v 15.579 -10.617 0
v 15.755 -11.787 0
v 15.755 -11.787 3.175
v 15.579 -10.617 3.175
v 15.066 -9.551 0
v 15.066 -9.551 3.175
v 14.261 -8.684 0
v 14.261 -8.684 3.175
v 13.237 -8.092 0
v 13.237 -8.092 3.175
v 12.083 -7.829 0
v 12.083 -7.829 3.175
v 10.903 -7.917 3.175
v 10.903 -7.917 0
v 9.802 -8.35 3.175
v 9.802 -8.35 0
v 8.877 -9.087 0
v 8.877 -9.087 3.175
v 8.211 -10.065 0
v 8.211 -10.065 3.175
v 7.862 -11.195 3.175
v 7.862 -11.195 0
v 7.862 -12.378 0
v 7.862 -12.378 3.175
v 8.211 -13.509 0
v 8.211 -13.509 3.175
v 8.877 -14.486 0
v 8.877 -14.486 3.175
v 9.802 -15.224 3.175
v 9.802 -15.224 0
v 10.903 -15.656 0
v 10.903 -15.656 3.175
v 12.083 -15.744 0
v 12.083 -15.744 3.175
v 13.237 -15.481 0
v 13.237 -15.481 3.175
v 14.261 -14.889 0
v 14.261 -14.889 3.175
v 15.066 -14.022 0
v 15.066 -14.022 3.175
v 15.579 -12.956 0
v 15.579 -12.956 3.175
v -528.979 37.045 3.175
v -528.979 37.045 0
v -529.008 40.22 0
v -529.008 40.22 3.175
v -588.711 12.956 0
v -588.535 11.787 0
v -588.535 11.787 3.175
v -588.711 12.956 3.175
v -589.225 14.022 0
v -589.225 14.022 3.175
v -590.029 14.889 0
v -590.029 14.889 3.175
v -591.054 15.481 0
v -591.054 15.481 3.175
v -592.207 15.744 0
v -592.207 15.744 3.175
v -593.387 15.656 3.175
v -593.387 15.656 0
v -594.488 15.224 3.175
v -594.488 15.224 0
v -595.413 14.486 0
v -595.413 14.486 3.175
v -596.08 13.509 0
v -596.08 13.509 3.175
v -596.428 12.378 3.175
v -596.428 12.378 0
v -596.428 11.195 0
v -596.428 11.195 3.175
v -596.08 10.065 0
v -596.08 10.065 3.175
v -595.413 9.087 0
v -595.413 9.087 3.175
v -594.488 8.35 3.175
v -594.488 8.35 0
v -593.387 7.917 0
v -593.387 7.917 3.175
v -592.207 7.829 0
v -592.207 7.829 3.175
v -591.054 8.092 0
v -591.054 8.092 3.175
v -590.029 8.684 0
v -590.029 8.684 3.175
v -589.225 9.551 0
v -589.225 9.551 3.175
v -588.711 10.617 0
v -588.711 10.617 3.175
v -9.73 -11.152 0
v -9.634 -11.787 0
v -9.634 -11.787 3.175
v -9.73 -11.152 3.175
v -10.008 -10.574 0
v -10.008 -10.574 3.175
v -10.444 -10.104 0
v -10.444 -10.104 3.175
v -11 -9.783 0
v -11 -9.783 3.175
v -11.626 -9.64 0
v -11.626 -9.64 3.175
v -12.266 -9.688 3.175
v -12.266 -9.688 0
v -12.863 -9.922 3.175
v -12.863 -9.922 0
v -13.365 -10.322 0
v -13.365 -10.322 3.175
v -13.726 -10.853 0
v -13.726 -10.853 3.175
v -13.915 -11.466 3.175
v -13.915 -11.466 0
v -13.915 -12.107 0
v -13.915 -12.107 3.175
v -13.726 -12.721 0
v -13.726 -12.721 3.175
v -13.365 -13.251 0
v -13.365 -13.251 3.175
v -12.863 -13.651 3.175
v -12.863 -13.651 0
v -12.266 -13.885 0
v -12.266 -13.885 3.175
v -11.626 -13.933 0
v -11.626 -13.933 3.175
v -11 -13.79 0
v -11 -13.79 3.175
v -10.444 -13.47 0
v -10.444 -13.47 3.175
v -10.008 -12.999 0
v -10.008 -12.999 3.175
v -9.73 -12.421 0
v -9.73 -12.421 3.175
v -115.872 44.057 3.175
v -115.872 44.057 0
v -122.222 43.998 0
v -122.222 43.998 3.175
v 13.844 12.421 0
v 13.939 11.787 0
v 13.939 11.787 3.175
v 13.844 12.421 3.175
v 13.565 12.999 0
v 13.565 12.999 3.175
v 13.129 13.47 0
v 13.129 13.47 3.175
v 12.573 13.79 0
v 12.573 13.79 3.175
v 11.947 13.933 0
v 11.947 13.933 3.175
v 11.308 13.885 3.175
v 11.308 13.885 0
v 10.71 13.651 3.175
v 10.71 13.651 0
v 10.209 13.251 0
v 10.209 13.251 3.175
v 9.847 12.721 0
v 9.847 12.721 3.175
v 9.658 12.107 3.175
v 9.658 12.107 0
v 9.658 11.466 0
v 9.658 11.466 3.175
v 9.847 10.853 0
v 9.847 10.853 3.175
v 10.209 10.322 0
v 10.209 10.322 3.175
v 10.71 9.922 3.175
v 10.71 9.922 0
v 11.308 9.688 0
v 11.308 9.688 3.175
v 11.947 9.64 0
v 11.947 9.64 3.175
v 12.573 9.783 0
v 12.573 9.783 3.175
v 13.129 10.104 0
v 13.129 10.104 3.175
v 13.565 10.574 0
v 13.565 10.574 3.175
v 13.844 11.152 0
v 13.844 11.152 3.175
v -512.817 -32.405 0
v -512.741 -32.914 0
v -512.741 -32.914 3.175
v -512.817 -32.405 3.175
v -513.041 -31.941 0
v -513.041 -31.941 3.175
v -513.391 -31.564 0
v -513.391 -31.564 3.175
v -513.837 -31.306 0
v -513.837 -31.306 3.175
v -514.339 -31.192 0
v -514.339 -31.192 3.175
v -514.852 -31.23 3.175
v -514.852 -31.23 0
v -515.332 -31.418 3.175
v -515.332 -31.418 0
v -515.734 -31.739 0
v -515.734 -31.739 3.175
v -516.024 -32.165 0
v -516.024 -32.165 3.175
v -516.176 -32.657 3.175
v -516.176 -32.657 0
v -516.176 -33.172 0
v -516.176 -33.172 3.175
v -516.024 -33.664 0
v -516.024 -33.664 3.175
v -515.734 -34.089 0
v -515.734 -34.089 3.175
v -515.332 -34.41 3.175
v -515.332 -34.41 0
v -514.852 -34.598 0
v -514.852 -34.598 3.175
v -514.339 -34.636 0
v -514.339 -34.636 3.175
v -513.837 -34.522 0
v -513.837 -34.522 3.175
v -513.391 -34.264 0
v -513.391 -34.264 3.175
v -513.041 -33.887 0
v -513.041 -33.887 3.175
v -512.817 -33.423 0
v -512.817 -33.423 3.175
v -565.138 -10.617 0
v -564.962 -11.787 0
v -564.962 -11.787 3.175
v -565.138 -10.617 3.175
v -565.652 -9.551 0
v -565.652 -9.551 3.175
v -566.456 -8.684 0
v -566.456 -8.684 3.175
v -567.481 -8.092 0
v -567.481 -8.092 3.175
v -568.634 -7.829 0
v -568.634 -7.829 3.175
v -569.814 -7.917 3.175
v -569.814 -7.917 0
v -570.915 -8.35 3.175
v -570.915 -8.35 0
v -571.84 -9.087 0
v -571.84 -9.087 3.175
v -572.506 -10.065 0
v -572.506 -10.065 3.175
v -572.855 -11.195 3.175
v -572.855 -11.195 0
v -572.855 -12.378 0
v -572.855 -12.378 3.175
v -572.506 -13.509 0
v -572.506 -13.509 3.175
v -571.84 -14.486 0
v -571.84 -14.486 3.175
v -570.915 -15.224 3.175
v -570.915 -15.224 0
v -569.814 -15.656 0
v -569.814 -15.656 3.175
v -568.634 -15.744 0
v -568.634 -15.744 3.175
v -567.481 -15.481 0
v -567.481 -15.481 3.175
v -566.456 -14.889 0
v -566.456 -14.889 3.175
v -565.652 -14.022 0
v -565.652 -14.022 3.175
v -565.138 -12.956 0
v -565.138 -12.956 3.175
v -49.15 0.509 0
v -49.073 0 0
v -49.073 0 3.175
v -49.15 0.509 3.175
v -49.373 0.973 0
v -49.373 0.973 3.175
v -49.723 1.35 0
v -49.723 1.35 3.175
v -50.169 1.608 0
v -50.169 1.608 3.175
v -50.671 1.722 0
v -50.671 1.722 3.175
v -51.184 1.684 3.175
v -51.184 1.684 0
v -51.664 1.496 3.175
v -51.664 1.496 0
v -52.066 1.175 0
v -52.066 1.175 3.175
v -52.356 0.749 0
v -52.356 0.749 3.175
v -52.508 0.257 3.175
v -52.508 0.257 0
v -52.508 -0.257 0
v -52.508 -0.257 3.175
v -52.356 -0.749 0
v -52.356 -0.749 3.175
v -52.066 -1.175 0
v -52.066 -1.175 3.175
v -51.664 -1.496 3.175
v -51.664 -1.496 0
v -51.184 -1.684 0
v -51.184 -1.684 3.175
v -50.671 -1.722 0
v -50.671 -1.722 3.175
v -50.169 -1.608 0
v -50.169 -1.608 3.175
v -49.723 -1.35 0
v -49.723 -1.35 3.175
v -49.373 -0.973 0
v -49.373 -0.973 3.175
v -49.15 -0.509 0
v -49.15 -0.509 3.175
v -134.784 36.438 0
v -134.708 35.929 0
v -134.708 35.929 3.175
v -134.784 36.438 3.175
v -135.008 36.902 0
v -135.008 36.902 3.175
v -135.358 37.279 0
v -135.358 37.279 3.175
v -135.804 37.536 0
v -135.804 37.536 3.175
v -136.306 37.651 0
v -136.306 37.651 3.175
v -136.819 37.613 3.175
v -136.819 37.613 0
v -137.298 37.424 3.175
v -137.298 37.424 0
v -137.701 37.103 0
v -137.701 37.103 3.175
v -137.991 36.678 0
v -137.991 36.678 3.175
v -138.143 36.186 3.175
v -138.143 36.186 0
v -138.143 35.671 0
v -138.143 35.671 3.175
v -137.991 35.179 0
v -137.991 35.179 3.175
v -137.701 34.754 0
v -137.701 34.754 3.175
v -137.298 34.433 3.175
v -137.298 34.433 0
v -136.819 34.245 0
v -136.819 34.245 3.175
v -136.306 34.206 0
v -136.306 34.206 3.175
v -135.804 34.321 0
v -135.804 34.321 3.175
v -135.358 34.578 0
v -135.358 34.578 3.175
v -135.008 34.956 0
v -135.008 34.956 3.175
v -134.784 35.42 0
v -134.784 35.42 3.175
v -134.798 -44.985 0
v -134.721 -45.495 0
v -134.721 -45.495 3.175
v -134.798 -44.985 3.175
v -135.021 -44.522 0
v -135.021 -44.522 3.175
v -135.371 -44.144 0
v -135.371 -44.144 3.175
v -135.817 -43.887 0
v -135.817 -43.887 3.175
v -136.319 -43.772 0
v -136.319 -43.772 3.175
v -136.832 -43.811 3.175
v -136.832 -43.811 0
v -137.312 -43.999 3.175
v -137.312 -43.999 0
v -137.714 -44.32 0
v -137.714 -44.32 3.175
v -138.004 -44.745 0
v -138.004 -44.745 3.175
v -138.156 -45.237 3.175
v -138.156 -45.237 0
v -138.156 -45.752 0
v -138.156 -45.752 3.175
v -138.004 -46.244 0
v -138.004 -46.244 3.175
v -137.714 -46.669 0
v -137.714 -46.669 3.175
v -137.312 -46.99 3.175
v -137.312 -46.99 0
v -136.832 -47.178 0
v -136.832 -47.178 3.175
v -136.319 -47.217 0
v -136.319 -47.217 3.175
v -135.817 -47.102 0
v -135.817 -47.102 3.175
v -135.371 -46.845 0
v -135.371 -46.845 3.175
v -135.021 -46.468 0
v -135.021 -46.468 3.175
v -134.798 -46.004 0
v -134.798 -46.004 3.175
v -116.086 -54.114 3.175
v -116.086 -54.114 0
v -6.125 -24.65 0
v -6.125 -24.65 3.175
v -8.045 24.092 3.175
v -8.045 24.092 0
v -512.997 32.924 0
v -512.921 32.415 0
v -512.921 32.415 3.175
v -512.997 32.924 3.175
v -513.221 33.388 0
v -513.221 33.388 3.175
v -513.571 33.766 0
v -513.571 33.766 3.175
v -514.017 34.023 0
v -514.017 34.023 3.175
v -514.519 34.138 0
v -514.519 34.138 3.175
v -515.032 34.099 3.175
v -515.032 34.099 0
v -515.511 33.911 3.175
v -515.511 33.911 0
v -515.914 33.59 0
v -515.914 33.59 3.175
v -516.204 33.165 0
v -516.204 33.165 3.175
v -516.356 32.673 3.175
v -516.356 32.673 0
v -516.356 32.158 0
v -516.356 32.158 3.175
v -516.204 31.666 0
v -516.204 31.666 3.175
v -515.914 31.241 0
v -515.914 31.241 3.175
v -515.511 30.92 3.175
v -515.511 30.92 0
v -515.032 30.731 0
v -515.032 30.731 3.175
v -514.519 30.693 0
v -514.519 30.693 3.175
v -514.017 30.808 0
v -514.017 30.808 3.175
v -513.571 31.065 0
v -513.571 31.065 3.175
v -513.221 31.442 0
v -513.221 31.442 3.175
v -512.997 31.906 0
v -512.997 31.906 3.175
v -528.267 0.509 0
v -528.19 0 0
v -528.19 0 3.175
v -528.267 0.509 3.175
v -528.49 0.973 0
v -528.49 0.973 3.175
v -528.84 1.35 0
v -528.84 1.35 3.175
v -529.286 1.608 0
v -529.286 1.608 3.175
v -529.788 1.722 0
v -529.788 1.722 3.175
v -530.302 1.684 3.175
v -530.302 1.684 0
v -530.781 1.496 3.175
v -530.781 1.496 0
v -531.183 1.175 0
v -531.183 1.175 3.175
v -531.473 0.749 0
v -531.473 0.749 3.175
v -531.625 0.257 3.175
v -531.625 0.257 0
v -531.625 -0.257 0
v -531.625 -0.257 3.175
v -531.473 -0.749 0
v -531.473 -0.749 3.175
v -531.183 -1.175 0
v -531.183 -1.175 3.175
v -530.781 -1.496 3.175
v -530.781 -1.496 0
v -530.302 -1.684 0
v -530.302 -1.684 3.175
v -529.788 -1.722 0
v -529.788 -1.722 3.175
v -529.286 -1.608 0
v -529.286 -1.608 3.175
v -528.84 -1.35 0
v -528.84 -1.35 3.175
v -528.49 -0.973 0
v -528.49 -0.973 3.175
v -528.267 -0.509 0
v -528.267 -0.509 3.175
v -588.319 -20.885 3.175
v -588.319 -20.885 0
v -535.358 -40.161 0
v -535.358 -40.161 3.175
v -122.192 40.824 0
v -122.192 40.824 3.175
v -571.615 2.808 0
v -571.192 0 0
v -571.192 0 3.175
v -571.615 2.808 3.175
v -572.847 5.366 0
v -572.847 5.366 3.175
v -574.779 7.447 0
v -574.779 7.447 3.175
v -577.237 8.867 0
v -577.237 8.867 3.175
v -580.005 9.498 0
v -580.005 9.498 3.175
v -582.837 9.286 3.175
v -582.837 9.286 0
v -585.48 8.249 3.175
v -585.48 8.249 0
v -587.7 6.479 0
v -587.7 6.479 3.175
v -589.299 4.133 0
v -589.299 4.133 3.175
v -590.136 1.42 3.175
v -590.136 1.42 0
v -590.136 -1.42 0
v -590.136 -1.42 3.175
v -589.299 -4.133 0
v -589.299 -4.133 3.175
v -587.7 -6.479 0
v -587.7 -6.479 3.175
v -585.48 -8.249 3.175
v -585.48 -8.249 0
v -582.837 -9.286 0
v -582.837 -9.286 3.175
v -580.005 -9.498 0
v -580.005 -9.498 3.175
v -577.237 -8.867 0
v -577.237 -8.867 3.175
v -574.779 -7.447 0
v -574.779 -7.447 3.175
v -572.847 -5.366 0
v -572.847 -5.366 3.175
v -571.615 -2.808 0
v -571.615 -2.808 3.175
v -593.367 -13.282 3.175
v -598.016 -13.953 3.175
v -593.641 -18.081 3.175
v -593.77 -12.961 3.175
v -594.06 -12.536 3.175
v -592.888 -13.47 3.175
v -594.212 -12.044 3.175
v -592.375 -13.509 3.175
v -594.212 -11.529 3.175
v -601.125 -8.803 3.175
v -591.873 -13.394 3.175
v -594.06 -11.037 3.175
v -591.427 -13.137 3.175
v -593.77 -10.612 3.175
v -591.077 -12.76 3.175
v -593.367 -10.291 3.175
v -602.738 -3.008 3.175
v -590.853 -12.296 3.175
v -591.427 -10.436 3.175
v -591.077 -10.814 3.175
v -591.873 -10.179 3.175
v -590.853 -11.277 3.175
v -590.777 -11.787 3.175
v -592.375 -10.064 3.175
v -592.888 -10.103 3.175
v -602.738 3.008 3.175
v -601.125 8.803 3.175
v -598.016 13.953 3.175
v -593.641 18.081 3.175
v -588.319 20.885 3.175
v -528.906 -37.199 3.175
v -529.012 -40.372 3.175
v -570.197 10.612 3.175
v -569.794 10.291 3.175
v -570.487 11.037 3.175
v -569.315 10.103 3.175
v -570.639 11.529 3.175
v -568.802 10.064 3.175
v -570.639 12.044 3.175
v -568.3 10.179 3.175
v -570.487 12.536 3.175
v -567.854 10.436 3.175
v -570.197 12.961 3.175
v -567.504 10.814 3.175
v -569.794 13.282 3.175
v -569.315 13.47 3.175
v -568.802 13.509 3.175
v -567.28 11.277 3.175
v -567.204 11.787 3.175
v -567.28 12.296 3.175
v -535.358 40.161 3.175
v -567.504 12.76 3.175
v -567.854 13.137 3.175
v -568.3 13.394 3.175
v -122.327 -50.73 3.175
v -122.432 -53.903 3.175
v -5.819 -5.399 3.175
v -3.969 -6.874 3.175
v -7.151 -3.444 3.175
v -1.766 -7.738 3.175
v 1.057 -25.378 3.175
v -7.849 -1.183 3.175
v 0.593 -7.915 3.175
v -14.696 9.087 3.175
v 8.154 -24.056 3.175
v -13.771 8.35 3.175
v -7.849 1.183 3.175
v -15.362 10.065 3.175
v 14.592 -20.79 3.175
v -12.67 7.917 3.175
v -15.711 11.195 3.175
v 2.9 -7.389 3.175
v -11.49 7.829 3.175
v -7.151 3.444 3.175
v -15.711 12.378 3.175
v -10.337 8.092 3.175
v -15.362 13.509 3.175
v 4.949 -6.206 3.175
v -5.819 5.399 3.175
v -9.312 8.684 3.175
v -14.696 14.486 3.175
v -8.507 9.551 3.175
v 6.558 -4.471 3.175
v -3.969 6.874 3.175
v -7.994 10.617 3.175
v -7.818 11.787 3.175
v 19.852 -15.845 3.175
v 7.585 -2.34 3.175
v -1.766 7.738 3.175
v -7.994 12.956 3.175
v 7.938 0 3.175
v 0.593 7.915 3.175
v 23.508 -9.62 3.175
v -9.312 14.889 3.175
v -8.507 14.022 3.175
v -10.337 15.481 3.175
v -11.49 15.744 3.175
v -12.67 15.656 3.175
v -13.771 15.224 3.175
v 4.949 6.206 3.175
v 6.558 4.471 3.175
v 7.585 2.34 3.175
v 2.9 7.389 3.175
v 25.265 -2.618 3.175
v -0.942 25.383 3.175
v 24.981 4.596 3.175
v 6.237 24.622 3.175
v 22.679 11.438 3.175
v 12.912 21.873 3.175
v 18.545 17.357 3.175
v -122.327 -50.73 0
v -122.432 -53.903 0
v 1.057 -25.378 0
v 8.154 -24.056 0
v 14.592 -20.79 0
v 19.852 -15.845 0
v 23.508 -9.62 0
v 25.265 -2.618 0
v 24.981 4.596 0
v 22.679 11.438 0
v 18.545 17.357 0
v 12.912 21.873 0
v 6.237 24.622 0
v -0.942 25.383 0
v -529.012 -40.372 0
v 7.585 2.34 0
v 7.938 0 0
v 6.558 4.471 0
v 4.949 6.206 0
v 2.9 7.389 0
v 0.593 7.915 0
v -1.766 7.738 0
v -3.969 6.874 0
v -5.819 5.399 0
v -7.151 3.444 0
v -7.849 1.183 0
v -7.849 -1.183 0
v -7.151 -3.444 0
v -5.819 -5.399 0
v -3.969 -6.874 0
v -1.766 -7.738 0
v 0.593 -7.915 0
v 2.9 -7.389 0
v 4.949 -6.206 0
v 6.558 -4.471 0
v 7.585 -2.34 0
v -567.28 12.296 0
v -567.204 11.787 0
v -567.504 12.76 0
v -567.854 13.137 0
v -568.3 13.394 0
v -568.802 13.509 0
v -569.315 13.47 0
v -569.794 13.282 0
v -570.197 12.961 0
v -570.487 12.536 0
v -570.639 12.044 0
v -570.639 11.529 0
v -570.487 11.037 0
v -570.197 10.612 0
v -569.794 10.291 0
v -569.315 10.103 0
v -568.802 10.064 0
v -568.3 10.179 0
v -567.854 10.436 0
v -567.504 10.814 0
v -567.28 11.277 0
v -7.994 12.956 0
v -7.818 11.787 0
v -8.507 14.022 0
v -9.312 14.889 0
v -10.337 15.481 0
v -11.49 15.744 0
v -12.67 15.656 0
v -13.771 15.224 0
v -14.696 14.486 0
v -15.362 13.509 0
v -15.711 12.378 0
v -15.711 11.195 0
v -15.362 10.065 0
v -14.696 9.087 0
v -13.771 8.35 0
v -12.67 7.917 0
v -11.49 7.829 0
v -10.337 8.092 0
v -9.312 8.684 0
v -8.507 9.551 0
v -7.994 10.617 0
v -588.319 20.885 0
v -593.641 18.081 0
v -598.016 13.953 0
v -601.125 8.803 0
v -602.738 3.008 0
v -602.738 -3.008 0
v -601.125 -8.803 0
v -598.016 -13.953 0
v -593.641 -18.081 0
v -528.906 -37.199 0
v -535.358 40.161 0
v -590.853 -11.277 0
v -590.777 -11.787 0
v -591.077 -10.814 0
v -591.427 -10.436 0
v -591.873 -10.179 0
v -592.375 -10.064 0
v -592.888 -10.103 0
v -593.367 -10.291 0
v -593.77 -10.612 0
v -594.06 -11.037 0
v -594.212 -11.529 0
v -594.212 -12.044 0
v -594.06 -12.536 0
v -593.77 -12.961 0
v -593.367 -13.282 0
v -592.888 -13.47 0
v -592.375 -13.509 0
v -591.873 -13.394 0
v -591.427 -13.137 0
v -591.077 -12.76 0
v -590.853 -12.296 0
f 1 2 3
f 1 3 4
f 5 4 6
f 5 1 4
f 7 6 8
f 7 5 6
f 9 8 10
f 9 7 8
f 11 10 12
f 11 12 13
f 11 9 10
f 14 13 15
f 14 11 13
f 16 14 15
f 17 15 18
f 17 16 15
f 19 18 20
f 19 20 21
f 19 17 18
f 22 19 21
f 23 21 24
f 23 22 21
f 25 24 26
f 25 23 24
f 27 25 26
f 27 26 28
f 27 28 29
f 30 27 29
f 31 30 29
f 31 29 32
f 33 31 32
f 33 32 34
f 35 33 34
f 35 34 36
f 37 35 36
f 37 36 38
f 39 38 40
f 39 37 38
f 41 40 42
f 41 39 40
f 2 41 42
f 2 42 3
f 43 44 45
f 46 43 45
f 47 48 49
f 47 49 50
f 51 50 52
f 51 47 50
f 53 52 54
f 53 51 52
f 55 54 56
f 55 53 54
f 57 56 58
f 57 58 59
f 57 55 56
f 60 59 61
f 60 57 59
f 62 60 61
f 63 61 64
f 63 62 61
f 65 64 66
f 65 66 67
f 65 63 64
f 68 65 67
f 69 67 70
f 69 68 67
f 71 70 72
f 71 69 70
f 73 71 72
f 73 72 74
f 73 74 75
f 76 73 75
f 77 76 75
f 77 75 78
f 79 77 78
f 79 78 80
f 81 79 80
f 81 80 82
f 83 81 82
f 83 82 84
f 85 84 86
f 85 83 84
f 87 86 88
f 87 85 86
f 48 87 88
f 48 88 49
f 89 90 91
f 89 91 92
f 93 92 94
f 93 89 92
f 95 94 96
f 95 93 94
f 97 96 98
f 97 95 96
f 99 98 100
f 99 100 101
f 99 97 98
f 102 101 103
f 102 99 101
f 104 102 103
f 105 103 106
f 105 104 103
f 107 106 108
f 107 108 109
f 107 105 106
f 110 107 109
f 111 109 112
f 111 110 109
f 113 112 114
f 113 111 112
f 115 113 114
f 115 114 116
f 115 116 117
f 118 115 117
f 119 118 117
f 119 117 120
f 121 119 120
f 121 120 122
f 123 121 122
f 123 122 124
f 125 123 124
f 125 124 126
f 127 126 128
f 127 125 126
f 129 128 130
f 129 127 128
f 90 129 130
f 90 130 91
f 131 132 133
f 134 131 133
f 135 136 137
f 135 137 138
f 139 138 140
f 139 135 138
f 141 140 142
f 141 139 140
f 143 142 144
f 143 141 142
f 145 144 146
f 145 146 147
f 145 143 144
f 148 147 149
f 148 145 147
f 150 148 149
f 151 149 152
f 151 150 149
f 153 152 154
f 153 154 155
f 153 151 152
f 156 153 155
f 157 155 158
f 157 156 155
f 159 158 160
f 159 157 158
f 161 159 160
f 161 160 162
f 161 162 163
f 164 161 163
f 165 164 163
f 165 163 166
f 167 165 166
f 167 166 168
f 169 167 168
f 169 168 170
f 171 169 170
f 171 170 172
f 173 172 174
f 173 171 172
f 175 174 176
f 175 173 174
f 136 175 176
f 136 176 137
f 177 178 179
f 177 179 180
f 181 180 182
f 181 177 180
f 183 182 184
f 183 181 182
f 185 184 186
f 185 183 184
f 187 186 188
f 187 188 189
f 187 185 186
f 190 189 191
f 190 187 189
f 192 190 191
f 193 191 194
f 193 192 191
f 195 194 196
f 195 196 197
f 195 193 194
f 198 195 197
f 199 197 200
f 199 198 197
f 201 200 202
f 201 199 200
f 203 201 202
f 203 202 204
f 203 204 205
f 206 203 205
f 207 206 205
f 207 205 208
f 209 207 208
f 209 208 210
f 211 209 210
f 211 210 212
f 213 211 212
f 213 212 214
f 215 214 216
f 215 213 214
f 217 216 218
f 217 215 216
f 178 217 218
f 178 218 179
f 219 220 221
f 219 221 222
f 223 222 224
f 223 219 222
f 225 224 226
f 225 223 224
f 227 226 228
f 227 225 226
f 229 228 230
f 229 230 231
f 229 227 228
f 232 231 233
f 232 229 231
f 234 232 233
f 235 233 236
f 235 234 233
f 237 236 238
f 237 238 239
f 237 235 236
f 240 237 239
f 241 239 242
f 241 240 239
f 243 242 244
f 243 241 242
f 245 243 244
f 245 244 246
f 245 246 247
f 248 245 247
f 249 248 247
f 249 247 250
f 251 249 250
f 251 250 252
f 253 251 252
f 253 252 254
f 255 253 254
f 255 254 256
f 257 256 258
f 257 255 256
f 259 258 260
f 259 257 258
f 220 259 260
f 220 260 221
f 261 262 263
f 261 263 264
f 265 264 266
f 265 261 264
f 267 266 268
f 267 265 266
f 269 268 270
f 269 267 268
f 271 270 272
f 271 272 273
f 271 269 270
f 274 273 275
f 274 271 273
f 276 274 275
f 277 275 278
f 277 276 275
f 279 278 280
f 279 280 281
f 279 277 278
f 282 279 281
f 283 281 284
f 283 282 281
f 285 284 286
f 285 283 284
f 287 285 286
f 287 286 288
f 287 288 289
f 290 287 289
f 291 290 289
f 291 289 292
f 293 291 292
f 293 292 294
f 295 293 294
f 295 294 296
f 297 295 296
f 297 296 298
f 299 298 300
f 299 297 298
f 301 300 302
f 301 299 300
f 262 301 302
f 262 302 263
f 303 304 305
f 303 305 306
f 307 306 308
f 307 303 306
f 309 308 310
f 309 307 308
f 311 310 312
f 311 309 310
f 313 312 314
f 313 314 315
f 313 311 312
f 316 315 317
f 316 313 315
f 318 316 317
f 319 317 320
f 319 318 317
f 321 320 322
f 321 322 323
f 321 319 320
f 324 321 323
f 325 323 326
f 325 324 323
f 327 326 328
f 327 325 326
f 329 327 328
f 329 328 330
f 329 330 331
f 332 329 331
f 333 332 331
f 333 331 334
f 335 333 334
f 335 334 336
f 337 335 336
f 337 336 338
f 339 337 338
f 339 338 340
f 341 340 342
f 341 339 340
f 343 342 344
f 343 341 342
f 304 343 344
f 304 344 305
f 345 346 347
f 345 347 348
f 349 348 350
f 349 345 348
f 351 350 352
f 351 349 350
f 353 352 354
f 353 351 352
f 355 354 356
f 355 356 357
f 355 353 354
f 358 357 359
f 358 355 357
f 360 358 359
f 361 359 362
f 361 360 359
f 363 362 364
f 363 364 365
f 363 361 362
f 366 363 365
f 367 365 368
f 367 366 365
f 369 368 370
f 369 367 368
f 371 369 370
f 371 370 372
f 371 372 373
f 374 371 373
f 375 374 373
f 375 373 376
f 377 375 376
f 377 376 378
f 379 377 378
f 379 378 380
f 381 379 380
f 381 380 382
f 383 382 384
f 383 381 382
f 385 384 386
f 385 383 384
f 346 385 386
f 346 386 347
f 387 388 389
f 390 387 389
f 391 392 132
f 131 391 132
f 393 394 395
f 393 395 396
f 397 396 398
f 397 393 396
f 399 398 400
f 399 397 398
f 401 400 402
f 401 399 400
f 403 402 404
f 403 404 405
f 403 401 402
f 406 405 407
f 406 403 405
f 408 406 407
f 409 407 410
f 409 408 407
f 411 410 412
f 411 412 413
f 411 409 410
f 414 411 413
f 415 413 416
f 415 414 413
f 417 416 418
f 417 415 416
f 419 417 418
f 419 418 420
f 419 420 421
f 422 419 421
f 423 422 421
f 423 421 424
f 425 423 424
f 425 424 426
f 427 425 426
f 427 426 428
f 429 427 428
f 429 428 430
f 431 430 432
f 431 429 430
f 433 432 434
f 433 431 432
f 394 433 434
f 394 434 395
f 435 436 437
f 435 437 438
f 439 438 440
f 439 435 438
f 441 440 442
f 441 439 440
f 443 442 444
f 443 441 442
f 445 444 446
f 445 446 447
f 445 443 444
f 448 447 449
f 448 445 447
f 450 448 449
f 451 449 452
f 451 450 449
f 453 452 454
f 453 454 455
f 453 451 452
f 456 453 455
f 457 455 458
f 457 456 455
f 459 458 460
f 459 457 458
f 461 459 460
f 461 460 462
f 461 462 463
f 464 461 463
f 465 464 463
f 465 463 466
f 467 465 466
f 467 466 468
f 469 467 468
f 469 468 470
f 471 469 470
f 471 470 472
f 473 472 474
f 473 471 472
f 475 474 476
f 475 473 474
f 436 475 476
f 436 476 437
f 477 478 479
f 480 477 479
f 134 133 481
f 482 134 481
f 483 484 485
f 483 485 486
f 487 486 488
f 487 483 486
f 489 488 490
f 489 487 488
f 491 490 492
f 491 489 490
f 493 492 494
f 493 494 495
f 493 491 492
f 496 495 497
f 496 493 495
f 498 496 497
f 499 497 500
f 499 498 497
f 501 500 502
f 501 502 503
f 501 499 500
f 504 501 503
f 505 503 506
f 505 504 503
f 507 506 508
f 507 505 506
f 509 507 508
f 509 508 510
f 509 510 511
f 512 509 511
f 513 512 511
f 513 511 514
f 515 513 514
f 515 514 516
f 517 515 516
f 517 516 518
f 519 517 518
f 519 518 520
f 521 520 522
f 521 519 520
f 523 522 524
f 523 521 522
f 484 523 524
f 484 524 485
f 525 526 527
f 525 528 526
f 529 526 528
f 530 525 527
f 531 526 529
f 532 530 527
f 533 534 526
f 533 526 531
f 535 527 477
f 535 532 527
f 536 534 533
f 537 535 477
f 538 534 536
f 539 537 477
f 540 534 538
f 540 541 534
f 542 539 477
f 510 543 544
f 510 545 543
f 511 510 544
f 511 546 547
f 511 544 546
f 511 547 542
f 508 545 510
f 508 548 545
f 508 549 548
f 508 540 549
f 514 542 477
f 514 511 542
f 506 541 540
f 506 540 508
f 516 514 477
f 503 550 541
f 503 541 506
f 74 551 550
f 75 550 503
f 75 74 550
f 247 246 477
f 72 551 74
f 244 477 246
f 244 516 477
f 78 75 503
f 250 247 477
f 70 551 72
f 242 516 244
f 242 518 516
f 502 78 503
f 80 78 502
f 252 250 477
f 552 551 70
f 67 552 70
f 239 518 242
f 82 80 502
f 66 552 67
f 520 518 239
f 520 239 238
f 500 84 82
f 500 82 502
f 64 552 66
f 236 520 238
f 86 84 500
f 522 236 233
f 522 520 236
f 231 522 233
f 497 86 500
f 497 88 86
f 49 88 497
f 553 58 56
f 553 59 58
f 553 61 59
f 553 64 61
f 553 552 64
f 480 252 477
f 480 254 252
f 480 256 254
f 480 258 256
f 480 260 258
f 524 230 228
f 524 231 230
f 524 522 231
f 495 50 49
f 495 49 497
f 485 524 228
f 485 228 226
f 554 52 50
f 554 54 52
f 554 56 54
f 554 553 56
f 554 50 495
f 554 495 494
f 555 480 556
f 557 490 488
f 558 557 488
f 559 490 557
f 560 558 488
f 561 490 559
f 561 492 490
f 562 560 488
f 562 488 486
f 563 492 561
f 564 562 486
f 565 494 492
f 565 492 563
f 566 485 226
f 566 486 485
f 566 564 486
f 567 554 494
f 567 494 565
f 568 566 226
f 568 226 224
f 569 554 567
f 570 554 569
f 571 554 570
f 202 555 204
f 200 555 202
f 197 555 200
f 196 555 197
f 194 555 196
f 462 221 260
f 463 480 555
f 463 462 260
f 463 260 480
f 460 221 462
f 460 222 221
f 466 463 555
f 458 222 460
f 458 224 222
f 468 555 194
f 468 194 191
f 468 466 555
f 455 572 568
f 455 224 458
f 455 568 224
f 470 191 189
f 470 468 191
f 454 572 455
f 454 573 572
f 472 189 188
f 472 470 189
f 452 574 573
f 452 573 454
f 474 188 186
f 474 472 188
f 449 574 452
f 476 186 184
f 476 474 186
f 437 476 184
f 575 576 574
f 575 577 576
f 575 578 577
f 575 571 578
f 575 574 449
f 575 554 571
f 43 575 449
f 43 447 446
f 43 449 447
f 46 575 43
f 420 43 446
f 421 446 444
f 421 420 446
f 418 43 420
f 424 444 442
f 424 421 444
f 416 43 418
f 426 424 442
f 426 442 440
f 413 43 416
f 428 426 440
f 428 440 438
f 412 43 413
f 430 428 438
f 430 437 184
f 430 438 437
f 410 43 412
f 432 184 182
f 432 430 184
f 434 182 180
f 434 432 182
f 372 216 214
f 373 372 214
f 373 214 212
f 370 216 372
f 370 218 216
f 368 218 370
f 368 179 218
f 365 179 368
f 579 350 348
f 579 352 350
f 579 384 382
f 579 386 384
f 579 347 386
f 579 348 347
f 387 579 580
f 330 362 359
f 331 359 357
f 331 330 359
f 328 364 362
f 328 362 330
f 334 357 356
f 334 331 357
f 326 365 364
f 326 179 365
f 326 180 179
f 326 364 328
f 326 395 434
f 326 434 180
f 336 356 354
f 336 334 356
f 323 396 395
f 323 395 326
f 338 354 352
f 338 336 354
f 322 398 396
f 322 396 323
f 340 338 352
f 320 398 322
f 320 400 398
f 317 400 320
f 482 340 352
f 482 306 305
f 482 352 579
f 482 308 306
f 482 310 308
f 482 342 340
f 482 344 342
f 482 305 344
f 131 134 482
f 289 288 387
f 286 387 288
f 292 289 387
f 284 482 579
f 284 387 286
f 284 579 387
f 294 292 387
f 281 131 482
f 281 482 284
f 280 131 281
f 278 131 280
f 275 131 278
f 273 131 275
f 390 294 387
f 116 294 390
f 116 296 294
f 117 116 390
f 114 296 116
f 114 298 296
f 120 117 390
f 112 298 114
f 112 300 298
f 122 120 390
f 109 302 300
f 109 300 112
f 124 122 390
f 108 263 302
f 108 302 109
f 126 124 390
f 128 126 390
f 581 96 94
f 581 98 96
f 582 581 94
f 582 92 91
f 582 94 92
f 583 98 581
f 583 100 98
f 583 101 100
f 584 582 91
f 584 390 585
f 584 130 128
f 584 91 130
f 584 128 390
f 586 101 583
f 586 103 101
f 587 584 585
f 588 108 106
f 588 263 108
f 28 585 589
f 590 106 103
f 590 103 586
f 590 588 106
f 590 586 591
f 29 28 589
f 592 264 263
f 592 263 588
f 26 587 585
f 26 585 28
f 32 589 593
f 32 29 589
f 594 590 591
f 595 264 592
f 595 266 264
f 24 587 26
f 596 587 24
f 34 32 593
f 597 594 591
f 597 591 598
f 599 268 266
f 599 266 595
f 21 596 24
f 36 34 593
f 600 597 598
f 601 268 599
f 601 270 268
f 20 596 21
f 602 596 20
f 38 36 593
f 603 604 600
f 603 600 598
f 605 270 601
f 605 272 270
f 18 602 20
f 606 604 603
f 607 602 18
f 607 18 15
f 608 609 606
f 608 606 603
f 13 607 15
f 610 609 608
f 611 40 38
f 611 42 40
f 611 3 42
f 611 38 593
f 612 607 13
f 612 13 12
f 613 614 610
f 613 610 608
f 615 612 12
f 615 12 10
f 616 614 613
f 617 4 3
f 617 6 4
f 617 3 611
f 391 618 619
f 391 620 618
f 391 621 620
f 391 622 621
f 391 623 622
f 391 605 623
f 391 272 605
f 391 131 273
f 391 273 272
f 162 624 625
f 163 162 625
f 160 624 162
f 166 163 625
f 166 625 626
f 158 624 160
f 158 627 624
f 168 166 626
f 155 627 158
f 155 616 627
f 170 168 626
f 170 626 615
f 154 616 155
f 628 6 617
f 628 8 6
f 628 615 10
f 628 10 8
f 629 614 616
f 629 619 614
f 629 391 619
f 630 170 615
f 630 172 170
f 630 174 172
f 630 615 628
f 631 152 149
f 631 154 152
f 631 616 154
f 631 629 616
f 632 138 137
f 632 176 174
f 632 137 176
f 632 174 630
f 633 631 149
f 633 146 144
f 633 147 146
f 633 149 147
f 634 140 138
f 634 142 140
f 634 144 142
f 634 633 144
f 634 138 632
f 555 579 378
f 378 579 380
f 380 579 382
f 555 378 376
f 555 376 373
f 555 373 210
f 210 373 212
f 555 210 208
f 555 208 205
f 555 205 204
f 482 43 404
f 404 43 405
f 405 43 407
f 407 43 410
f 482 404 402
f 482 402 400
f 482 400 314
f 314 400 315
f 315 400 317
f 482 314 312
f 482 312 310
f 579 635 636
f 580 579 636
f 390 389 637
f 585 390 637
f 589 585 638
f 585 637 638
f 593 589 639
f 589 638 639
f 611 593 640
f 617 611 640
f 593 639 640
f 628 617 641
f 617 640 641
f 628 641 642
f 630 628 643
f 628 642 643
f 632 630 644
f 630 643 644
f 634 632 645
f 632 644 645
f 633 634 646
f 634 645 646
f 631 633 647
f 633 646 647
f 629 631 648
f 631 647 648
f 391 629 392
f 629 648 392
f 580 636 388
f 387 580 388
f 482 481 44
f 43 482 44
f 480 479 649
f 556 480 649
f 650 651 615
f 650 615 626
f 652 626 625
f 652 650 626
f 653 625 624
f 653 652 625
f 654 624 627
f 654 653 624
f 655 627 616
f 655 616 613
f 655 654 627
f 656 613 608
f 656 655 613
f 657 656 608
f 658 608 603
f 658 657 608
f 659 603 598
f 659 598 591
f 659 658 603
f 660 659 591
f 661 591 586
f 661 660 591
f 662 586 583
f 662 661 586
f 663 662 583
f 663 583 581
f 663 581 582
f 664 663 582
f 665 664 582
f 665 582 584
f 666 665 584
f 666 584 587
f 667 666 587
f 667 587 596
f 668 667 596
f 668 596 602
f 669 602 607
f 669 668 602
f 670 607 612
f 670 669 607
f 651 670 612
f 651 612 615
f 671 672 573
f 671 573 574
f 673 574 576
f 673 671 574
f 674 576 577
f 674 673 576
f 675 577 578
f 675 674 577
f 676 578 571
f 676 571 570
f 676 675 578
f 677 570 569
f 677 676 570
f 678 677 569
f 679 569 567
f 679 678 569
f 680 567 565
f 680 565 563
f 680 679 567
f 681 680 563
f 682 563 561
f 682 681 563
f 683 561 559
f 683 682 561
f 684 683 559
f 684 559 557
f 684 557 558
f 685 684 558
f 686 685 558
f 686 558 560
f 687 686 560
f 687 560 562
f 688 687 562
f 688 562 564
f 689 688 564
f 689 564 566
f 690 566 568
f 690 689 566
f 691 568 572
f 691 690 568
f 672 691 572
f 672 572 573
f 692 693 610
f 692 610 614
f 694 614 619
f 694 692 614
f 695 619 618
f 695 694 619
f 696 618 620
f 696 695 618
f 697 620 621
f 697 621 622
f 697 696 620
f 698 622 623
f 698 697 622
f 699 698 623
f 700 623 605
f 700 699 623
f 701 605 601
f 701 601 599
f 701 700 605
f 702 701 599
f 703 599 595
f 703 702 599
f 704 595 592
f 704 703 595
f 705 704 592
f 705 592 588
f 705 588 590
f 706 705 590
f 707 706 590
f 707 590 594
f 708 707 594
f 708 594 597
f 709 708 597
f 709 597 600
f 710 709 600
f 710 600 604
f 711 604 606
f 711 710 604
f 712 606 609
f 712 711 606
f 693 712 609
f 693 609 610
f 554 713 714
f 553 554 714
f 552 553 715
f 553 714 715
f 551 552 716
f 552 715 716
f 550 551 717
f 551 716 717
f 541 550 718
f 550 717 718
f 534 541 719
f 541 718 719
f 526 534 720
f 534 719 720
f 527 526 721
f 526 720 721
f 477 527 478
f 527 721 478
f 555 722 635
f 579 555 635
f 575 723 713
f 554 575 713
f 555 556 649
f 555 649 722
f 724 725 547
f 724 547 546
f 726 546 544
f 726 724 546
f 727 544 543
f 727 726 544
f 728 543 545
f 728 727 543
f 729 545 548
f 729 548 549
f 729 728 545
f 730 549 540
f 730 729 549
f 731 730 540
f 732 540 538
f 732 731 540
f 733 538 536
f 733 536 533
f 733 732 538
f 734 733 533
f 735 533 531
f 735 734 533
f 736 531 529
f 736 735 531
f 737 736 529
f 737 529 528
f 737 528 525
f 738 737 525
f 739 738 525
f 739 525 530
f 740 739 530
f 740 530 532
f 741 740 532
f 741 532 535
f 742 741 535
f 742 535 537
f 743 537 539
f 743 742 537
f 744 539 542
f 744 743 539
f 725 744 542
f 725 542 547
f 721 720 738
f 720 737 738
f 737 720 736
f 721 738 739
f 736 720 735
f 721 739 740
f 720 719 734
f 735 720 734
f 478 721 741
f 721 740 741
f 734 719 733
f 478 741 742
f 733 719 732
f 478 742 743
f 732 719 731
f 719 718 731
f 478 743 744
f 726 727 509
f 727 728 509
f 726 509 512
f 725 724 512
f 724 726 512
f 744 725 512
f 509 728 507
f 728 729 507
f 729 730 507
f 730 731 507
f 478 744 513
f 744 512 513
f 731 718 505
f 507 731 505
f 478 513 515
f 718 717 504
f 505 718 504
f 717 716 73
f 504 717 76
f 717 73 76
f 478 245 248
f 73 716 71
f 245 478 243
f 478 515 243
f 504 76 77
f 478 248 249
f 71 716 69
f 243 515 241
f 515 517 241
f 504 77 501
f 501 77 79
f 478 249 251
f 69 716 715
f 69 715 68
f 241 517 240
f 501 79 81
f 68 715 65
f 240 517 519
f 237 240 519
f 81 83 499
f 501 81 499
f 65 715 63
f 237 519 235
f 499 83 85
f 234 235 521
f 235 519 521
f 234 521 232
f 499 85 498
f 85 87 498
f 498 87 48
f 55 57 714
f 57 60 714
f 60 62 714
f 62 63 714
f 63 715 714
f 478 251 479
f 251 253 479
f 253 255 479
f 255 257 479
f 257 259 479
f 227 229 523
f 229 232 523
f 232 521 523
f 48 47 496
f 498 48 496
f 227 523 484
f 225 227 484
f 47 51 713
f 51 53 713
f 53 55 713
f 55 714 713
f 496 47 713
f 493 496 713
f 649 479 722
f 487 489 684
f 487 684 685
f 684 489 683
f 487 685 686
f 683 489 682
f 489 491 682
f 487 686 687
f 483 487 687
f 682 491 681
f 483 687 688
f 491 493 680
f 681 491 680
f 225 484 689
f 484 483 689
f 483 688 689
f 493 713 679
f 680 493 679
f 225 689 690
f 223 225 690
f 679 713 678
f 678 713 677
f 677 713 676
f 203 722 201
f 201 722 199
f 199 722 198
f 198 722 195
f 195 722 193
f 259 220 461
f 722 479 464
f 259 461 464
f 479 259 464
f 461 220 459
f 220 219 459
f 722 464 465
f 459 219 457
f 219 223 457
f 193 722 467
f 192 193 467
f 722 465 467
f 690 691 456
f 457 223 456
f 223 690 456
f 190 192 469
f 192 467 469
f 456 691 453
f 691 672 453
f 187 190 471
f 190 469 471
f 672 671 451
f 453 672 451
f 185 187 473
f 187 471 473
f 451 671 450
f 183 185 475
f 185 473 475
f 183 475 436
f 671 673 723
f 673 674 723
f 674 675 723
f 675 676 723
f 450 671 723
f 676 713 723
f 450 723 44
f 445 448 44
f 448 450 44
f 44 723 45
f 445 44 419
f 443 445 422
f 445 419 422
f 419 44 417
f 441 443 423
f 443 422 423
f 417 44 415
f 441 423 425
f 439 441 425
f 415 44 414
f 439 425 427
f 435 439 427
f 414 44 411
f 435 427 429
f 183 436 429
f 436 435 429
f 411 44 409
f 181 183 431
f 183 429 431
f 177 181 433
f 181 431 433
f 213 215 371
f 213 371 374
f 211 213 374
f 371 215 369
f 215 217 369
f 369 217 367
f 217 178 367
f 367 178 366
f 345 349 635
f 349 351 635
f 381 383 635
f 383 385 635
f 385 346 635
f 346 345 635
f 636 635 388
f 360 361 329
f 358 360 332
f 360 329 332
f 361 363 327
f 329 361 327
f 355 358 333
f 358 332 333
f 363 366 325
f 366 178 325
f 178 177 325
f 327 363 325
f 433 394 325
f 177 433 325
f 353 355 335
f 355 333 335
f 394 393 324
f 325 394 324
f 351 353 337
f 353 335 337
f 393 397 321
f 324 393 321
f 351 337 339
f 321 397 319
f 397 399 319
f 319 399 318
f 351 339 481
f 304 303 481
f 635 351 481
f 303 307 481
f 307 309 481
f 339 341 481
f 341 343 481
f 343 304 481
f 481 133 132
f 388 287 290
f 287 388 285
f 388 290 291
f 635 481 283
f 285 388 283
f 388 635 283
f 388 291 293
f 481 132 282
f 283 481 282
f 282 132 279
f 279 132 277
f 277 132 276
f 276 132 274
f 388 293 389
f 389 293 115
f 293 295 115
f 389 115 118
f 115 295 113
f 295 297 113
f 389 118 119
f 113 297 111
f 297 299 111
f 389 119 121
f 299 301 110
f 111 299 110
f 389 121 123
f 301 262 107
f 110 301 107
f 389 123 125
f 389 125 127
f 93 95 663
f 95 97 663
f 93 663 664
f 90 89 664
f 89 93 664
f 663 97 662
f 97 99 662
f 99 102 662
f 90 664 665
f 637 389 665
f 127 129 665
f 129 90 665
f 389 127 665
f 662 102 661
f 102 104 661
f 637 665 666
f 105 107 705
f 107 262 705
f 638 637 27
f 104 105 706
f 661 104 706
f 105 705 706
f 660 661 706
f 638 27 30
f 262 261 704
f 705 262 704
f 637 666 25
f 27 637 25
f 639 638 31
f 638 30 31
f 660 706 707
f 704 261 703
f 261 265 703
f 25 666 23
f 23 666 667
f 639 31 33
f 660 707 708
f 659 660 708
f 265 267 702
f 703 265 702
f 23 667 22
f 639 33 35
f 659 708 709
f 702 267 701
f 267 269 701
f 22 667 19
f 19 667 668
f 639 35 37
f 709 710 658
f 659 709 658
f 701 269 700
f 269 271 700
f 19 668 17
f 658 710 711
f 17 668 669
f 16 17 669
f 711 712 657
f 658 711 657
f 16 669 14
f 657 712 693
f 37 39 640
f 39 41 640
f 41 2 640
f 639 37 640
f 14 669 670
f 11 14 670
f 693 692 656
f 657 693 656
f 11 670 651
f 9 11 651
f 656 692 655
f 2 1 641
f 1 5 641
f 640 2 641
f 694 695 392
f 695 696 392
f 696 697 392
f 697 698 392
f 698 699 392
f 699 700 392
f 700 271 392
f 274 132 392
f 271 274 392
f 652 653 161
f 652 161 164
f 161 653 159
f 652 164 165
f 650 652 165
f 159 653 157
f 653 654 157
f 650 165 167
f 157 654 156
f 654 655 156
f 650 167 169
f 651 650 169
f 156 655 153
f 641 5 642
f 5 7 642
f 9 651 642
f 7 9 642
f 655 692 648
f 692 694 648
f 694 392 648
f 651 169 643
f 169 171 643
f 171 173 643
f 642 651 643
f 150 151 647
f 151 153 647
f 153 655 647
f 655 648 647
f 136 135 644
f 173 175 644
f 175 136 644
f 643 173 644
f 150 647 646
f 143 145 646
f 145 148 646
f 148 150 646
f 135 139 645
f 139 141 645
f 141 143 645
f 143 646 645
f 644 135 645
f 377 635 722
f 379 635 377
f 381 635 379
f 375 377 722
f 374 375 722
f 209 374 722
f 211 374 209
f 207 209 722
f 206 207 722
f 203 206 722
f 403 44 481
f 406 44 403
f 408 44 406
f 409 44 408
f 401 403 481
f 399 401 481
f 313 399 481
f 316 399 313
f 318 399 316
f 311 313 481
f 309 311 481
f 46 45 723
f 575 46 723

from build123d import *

# Parameters (mm, degrees)
F0_R     = 1.7272
F0_R_2   = 3.96875
F0_R_3   = 2.15265
F0_R_4   = 9.525
F0_R_5   = 7.9375
F1_DEPTH = 3.175


with BuildPart() as f1:
    # F0 (on Top) → F1 (new body)
    with BuildSketch(Plane.XY):
        with BuildLine():
            Line((-535.358043, 40.160772), (-588.318702, 20.884668))
            ThreePointArc((-588.318702, 20.884668), (-602.942304, 0), (-588.318702, -20.884668))
            Line((-588.318702, -20.884668), (-535.358043, -40.160772))
            Line((-535.358043, -40.160772), (-529.011557, -40.371983))
            Line((-529.011557, -40.371983), (-528.905951, -37.19874))
            Line((-528.905951, -37.19874), (-122.326798, -50.729687))
            Line((-122.326798, -50.729687), (-122.432403, -53.90293))
            Line((-122.432403, -53.90293), (-116.085917, -54.114141))
            Line((-116.085917, -54.114141), (-6.125468, -24.650327))
            ThreePointArc((-6.125468, -24.650327), (25.380331, 0.99941), (-8.044825, 24.092339))
            Line((-8.044825, 24.092339), (-115.871895, 44.057476))
            Line((-115.871895, 44.057476), (-122.221621, 43.998492))
            Line((-122.221621, 43.998492), (-122.192129, 40.823629))
            Line((-122.192129, 40.823629), (-528.978825, 37.044893))
            Line((-528.978825, 37.044893), (-529.008317, 40.219756))
            Line((-529.008317, 40.219756), (-535.358043, 40.160772))
        make_face()
        with Locations((-514.467949, -32.914099)):
            Circle(F0_R, mode=Mode.SUBTRACT)
        with Locations((-592.503891, -11.786586)):
            Circle(F0_R, mode=Mode.SUBTRACT)
        with Locations((-568.930718, -11.786586)):
            Circle(F0_R_2, mode=Mode.SUBTRACT)
        with Locations((-136.447984, -45.494597)):
            Circle(F0_R, mode=Mode.SUBTRACT)
        with Locations((-11.786586, -11.786586)):
            Circle(F0_R_3, mode=Mode.SUBTRACT)
        with Locations((11.786586, -11.786586)):
            Circle(F0_R_2, mode=Mode.SUBTRACT)
        with Locations((-580.717304, 0)):
            Circle(F0_R_4, mode=Mode.SUBTRACT)
        with Locations((-529.917304, 0)):
            Circle(F0_R, mode=Mode.SUBTRACT)
        with Locations((-592.503891, 11.786586)):
            Circle(F0_R_2, mode=Mode.SUBTRACT)
        with Locations((-568.930718, 11.786586)):
            Circle(F0_R, mode=Mode.SUBTRACT)
        with Locations((-514.647704, 32.415313)):
            Circle(F0_R, mode=Mode.SUBTRACT)
        with Locations((-50.8, 0)):
            Circle(F0_R, mode=Mode.SUBTRACT)
        Circle(F0_R_5, mode=Mode.SUBTRACT)
        with Locations((-11.786586, 11.786586)):
            Circle(F0_R_2, mode=Mode.SUBTRACT)
        with Locations((11.786586, 11.786586)):
            Circle(F0_R_3, mode=Mode.SUBTRACT)
        with Locations((-136.434775, 35.92862)):
            Circle(F0_R, mode=Mode.SUBTRACT)
    extrude(amount=F1_DEPTH)


solid = f1.part
